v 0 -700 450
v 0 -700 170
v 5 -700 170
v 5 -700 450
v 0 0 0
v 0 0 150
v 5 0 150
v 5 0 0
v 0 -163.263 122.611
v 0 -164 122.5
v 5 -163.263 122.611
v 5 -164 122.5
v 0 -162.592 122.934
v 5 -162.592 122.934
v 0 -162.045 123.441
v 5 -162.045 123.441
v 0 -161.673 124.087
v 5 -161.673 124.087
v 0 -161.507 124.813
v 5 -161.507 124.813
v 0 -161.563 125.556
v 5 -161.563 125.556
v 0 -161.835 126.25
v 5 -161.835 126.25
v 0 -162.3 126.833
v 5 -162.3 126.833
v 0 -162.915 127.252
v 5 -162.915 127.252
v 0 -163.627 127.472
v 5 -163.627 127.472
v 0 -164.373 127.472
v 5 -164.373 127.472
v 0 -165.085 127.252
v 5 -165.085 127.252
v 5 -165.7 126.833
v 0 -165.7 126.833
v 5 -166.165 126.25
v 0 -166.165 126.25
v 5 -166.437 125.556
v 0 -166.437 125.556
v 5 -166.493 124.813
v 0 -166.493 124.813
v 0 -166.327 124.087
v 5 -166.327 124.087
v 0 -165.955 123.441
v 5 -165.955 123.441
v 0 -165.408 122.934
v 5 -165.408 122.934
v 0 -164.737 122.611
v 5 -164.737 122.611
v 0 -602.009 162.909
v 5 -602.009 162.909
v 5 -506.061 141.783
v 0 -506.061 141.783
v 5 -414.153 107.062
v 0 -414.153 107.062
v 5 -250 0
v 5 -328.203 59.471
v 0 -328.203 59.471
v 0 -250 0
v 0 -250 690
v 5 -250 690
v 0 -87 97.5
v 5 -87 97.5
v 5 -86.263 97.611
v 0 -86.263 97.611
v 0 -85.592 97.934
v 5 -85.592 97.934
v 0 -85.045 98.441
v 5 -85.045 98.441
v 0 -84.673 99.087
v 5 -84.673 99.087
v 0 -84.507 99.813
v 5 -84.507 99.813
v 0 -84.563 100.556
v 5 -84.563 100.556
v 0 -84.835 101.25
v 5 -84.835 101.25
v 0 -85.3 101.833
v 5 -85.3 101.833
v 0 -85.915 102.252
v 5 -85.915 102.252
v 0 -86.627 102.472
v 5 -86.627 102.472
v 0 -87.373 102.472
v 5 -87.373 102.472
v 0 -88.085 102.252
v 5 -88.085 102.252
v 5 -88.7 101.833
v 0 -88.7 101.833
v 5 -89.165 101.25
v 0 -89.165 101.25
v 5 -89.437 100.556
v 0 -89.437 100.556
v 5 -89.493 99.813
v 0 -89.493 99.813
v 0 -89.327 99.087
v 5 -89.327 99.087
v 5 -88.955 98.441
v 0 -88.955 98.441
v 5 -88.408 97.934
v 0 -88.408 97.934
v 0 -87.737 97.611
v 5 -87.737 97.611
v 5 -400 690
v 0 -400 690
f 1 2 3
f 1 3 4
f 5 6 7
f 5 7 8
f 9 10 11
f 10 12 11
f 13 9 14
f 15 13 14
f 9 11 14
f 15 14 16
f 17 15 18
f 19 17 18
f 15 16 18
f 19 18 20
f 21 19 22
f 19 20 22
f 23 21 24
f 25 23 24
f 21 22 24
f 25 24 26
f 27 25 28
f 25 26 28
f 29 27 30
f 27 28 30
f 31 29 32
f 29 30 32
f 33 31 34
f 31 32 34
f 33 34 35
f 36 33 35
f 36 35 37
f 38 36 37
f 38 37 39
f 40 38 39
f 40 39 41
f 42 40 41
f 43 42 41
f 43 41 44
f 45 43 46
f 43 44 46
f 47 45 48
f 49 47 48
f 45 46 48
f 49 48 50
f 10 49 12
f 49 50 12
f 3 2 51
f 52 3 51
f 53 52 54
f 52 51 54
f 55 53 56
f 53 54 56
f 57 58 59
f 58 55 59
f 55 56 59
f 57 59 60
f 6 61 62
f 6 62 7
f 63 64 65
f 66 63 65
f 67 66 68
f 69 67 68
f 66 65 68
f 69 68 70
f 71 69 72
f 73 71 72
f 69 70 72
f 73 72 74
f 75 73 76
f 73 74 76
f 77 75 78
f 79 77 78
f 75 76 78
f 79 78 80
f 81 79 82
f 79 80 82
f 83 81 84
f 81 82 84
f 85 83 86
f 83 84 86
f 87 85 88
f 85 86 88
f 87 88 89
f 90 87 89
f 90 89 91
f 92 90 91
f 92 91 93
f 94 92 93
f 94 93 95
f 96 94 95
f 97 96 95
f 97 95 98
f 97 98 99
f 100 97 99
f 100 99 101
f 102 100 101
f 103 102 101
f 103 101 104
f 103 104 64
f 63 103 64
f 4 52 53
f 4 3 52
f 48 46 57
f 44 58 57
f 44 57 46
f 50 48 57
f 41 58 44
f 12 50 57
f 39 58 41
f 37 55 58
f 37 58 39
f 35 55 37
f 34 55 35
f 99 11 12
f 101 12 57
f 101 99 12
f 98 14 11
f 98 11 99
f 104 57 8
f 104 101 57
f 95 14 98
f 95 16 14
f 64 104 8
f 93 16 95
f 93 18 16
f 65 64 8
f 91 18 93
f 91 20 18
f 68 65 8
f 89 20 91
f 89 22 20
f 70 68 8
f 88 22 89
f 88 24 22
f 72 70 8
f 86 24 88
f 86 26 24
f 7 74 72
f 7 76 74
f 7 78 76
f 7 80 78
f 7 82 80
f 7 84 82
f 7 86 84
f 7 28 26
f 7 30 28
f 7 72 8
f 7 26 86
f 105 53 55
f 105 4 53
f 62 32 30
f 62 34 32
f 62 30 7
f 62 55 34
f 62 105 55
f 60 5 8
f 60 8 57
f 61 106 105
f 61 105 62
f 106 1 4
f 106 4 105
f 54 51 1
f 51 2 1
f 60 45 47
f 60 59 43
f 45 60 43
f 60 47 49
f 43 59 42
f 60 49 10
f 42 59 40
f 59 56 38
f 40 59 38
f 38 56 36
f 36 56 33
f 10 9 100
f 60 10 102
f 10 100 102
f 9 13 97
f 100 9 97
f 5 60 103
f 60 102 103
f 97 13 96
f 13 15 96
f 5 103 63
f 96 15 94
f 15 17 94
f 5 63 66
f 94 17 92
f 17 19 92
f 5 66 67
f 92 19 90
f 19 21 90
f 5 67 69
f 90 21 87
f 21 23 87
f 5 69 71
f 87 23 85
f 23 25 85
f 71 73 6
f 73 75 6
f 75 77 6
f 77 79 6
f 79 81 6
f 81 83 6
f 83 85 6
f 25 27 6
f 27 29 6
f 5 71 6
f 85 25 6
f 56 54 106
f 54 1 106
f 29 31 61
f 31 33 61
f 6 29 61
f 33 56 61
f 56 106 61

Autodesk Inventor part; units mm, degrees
ref_plane "YZ Plane" through (0, 0, 0) normal (1, 0, 0) x (0, 1, 0)
ref_plane "XZ Plane" through (0, 0, 0) normal (0, 1, 0) x (-1, 0, 0)
ref_plane "XY Plane" through (0, 0, 0) normal (0, 0, 1) x (1, 0, 0)
sketch "スケッチ1" plane through (0, 0, 0) normal (1, 0, 0) x (0, 1, 0)
  line L0 (-700, 170) -> (-700, 450)
  line L1 (-700, 450) -> (-400, 690)
  line L2 (-400, 690) -> (-250, 690)
  line L3 (-250, 690) -> (0, 150)
  line L4 (0, 150) -> (0, 0)
  line L5 (0, 0) -> (-250, 0)
  arc A0 (-250, 0) -> (-700, 170) centre (-700, -510.5882) ccw
  dimension "d0" = 690
  dimension "d1" = 280
  dimension "d2" = 240
  dimension "d3" = 300
  dimension "d4" = 150
  dimension "d5" = 700
  dimension "d6" = 250
  dimension "d7" = 150
extrude "押し出し1" add sketch "スケッチ1" along normal blind 5
sketch "スケッチ2" plane through (5, 0, 0) normal (1, 0, 0) x (0, 0, -1)
  circle A0 centre (-100, -87) radius 2.5
  line L0 (0, 0) -> (-150, 0) projected
  line L1 (0, -250) -> (0, 0) projected
  circle A1 centre (-125, -164) radius 2.5
  dimension "d10" = 87
  dimension "d11" = 100
  dimension "d12" = 5
  dimension "d13" = 164
  dimension "d14" = 125
  dimension "d15" = 5
extrude "押し出し2" cut sketch "スケッチ2" against normal through all
properties part number "end_plate" material "CFRP"
